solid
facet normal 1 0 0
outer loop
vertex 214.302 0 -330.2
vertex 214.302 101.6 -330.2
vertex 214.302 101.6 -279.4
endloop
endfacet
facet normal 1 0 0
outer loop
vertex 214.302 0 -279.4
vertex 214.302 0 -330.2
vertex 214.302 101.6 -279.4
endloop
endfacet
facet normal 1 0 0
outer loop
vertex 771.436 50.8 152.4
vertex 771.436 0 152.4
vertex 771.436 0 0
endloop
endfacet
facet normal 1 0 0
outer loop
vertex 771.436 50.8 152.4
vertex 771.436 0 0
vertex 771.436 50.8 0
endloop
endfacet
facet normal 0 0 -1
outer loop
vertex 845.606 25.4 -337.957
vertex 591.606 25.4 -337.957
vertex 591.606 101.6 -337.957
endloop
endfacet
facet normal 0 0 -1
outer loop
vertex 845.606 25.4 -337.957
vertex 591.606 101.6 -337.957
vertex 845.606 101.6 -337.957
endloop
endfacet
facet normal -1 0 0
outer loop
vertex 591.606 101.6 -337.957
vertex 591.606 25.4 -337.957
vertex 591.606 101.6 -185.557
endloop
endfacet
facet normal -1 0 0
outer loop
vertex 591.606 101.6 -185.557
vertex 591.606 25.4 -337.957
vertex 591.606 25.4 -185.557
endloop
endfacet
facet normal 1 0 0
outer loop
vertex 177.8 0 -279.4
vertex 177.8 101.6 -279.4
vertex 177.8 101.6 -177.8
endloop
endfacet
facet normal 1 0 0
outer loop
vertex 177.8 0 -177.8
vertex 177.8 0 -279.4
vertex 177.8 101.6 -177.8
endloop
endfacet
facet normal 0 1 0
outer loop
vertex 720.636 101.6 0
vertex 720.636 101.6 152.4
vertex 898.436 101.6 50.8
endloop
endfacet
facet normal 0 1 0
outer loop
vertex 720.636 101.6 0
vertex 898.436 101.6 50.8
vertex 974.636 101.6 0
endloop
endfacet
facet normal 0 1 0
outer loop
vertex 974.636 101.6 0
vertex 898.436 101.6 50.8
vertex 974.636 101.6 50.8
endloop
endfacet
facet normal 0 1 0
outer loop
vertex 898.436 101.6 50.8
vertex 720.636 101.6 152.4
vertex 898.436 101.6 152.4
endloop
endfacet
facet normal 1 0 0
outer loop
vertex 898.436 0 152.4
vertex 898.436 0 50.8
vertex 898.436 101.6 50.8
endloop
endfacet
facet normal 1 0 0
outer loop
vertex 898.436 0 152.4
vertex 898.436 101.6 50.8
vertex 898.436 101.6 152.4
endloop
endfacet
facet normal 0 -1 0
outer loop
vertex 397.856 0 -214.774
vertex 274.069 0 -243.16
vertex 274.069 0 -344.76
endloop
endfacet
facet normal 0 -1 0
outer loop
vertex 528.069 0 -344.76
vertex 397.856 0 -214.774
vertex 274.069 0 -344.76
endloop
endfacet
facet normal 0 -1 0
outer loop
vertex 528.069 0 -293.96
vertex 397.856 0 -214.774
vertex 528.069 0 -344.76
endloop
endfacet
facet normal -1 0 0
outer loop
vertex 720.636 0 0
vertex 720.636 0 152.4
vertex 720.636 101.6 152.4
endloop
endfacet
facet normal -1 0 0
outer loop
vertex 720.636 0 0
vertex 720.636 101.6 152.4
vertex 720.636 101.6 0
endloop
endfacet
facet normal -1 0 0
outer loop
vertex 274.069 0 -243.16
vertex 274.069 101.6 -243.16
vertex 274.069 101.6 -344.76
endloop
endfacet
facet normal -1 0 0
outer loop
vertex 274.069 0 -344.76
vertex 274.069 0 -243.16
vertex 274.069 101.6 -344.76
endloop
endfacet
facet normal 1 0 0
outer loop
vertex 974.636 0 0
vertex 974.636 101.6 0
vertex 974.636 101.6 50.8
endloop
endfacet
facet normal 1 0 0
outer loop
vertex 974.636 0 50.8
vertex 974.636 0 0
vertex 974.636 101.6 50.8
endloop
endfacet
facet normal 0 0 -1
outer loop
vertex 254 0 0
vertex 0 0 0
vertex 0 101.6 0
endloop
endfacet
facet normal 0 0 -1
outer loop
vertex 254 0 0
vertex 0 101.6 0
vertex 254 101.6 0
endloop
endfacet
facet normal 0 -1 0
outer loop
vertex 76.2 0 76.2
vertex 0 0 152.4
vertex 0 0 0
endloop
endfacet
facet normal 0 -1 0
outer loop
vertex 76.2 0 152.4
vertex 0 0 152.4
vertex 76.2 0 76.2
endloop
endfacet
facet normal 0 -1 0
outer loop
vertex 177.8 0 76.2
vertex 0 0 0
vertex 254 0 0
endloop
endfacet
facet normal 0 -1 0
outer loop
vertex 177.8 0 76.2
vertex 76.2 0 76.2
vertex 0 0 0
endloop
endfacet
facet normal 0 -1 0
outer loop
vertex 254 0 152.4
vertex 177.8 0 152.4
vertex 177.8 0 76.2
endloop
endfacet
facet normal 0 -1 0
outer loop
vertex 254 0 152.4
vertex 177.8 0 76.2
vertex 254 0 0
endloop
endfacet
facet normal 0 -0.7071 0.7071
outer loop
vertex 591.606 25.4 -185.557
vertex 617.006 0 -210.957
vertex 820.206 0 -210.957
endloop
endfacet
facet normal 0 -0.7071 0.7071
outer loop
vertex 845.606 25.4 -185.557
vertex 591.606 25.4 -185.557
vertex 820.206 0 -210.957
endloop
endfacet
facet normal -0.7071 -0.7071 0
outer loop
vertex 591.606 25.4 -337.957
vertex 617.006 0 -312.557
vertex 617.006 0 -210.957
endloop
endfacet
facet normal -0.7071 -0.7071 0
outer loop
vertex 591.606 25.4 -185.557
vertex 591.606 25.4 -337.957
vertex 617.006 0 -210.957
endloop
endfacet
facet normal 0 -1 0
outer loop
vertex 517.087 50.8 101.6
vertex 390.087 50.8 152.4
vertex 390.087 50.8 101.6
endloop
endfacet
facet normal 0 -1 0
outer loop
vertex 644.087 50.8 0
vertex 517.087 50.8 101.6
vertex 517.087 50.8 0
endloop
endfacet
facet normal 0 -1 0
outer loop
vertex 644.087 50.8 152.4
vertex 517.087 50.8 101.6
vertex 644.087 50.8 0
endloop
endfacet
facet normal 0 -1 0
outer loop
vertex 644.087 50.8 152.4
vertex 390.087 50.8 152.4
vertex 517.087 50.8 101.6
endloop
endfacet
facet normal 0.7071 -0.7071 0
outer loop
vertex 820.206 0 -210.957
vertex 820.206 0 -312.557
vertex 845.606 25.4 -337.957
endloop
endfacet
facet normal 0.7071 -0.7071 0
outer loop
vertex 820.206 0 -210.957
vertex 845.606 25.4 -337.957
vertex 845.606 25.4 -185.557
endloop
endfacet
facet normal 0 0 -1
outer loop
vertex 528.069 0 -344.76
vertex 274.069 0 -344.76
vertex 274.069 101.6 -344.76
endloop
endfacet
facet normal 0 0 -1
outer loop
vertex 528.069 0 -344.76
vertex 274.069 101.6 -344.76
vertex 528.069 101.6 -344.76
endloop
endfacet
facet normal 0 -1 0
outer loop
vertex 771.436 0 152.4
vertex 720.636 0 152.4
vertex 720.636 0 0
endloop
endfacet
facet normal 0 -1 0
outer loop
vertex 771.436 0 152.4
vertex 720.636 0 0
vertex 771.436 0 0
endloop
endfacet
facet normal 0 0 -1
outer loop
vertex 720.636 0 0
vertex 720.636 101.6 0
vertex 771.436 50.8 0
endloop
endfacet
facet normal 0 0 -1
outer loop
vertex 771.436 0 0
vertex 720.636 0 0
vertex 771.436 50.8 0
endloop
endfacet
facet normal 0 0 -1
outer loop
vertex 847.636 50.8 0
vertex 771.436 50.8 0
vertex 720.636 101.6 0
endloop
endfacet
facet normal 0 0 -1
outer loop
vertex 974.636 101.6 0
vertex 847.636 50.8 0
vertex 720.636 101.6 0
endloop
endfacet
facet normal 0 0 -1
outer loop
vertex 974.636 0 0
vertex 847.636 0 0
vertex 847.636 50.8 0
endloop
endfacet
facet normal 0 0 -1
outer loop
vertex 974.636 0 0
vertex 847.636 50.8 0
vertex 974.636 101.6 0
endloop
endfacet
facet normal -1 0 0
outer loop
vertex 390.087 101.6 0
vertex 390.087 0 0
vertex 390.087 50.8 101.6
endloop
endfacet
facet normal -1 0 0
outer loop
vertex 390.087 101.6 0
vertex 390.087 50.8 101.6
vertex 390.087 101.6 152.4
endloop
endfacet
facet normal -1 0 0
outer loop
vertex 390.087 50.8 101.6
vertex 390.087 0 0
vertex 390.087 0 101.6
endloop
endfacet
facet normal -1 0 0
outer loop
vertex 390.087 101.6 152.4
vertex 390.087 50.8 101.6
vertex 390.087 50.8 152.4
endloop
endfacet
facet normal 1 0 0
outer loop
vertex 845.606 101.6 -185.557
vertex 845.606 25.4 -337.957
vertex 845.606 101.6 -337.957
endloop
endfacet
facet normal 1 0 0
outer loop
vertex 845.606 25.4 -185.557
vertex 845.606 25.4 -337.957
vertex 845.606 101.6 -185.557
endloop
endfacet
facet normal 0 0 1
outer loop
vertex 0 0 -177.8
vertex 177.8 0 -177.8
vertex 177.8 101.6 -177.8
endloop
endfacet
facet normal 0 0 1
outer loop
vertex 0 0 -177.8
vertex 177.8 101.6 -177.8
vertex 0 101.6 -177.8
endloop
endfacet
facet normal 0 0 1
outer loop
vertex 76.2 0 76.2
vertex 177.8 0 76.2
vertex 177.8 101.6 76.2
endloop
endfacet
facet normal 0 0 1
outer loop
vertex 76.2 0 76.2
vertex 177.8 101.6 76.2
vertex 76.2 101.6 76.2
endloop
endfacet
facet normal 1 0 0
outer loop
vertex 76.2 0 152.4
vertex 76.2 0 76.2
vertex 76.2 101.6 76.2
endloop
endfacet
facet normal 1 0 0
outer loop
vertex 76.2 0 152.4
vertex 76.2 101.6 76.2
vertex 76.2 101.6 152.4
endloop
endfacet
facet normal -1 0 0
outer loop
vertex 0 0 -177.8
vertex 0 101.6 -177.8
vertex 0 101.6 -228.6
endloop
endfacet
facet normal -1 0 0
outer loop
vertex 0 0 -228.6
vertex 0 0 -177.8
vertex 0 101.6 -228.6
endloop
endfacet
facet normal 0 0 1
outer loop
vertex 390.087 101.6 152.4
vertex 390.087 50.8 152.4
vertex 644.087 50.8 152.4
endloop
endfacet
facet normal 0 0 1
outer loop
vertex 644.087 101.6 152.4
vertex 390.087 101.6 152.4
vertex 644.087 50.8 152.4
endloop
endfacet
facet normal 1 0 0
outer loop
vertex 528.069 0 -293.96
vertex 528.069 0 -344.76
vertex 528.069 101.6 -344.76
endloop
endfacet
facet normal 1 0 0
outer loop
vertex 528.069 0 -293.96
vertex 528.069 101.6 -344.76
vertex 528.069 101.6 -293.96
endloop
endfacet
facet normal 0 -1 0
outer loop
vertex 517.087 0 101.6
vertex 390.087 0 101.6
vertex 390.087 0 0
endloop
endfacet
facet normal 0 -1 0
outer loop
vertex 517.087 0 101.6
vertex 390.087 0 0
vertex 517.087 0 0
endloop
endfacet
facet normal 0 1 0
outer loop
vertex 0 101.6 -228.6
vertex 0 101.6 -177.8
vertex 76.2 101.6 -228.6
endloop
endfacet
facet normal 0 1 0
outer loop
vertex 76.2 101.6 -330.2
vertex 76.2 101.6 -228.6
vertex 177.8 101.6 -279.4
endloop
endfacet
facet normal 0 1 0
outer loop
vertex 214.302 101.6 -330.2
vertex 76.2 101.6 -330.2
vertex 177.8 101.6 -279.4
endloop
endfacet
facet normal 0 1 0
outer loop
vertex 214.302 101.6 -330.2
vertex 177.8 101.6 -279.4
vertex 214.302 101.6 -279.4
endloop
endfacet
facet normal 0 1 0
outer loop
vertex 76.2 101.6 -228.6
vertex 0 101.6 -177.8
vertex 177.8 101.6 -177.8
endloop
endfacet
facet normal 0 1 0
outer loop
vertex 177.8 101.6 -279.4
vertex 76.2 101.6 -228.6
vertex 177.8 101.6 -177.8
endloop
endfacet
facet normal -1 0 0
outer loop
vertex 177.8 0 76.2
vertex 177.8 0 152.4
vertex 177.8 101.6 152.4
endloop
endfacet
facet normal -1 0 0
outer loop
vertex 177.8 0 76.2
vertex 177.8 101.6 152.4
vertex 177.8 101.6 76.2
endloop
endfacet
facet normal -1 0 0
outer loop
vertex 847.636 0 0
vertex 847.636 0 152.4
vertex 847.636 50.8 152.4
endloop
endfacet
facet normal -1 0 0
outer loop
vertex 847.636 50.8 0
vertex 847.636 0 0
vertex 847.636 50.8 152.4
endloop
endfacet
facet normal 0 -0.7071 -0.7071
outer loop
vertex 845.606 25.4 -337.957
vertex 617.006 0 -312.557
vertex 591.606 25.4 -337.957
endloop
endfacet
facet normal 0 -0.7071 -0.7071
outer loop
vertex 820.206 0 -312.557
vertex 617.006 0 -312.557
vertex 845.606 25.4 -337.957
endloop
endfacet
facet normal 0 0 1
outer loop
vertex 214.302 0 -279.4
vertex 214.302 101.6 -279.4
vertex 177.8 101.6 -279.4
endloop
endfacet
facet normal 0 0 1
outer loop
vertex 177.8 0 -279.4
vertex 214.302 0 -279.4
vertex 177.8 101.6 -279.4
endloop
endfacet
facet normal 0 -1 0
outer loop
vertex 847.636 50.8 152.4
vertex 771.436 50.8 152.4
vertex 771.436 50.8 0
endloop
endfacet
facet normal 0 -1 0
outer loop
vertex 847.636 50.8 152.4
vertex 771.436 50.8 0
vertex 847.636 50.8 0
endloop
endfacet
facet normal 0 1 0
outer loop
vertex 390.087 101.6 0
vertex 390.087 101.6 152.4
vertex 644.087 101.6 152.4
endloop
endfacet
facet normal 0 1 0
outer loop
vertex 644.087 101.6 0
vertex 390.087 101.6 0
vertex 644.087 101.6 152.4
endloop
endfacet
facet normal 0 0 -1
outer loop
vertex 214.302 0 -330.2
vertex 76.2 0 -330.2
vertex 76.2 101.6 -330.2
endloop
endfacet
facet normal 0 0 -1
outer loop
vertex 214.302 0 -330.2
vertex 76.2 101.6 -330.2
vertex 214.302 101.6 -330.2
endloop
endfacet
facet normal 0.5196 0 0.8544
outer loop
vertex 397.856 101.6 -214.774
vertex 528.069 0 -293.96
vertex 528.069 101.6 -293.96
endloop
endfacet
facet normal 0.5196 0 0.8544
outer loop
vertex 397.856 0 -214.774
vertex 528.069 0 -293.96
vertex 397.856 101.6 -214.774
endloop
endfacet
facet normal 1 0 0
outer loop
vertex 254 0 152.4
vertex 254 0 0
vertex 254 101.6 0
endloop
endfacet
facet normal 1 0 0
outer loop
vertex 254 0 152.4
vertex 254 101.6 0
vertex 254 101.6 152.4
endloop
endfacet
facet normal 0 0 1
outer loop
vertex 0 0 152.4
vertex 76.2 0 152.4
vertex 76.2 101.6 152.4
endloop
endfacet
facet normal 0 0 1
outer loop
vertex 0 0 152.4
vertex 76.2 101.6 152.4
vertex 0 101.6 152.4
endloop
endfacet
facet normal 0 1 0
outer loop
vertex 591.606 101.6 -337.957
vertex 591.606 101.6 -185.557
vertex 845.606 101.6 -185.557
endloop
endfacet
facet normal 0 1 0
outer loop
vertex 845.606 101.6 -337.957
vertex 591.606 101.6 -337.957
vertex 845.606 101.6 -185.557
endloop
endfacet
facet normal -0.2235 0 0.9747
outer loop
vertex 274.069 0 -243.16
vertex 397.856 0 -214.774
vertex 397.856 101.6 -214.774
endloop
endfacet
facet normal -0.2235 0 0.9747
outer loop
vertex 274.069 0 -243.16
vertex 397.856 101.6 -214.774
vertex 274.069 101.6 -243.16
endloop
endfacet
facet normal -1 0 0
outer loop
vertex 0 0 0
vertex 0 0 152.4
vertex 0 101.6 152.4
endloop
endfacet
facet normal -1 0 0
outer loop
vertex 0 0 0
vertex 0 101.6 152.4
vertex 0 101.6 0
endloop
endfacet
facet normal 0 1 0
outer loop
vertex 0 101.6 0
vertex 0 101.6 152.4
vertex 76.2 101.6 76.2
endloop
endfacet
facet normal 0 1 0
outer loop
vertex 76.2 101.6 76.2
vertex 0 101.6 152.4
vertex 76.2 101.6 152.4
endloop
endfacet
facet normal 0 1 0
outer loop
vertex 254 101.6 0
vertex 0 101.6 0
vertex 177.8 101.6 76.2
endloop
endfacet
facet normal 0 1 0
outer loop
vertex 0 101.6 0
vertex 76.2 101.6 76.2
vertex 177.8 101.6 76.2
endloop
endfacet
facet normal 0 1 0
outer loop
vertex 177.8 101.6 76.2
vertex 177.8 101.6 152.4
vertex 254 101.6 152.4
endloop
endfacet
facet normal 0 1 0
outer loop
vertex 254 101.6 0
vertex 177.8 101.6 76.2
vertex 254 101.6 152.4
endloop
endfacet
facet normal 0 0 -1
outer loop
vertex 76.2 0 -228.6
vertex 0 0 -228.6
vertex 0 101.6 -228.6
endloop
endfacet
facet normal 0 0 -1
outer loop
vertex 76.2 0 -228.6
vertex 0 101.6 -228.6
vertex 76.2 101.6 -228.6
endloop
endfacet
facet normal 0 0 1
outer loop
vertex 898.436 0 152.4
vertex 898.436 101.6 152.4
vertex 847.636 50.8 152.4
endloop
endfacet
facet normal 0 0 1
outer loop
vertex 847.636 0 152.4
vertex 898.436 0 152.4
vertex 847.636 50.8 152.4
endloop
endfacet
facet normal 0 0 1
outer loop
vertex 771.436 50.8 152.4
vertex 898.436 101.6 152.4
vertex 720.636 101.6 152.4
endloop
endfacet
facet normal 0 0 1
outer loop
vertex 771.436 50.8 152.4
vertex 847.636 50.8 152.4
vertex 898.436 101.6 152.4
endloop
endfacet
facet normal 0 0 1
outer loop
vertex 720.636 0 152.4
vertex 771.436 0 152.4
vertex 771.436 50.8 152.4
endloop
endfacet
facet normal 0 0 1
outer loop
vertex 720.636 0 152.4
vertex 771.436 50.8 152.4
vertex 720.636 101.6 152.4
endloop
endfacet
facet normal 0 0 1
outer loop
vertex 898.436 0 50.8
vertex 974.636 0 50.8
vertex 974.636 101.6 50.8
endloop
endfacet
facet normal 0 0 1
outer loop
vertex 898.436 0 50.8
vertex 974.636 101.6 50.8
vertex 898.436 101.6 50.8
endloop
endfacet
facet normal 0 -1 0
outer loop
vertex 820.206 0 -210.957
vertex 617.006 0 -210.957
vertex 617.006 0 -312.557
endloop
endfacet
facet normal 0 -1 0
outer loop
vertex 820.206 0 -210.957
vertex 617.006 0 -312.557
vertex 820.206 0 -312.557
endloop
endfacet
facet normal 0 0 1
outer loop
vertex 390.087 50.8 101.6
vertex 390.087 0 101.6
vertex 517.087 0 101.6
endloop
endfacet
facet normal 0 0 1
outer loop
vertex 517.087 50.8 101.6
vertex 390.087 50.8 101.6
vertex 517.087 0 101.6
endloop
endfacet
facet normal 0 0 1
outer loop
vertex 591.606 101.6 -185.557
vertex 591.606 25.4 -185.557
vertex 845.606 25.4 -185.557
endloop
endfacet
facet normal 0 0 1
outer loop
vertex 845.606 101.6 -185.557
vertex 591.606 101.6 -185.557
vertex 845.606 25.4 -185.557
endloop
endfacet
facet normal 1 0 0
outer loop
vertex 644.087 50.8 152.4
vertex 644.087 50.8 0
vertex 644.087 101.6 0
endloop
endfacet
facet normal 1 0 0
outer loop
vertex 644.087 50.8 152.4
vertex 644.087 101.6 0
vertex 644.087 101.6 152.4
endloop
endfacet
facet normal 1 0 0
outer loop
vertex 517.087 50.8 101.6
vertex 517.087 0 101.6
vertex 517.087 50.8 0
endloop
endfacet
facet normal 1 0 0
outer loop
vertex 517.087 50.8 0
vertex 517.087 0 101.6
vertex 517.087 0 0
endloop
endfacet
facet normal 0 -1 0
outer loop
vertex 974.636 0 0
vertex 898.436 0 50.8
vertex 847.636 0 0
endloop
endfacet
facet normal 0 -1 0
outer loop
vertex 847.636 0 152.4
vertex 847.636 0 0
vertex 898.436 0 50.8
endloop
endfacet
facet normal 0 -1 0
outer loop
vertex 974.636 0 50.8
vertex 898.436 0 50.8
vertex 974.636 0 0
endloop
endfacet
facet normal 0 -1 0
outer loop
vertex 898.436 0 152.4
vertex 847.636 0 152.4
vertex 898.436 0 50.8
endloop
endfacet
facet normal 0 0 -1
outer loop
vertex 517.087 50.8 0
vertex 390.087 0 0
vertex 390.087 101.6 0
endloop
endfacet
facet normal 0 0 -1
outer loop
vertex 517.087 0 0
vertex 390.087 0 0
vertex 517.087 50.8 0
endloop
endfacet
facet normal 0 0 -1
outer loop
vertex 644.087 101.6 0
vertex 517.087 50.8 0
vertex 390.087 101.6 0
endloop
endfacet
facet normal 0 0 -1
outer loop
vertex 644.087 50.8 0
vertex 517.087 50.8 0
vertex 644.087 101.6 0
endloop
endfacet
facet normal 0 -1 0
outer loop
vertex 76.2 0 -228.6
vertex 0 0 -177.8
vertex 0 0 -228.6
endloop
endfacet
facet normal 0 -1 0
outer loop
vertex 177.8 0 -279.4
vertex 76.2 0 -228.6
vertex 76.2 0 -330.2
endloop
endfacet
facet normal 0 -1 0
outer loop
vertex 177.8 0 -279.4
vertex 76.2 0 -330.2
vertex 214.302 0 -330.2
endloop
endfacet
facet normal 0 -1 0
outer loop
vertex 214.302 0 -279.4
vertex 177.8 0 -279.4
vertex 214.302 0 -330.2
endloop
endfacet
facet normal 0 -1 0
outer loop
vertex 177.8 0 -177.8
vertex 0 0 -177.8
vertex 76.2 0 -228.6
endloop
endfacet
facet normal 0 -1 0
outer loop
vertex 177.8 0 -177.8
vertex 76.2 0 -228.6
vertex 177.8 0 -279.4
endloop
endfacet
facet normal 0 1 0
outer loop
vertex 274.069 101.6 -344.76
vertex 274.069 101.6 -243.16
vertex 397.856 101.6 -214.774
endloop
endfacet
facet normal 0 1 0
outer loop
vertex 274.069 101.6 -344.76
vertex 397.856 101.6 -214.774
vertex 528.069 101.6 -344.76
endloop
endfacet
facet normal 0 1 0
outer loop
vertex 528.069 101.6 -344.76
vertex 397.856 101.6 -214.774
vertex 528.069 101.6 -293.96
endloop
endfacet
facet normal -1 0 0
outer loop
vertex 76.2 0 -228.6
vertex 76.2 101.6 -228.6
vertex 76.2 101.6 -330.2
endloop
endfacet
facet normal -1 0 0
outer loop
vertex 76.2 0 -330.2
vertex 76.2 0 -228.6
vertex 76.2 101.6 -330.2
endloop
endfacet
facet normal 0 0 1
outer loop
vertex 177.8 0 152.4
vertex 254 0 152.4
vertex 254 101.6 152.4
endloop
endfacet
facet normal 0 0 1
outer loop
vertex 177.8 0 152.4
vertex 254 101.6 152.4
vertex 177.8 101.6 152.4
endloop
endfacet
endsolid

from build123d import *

# Parameters (mm, degrees)
F1_DEPTH  = 101.6
F2_W      = 254
F2_H      = 152.4
F3_DEPTH  = 101.6
F5_DEPTH  = 50.8
F7_DEPTH  = 101.6
F8_W      = 76.2
F8_H      = 50.8
F9_DEPTH  = 152.4
F11_DEPTH = 101.6
F13_DEPTH = 101.6
F14_W     = 254
F14_H     = 152.4
F15_DEPTH = 101.6
F16_SIZE  = 25.4
F17_DEPTH = 25.4
F18_DEPTH = 74.676


with BuildPart() as f1:
    # F0 (on Front) → F1 (new body)
    with BuildSketch(Plane.XZ):
        Polygon((0, 152.4), (0, 0), (254, 0), (254, 152.4), (177.8, 152.4), (177.8, 76.2), (76.2, 76.2), (76.2, 152.4), align=None)
    extrude(amount=-F1_DEPTH)



with BuildPart() as f3:
    # F2 (on Front) → F3 (new body)
    with BuildSketch(Plane.XZ):
        with Locations((517.0868965597, 76.2)):
            Rectangle(F2_W, F2_H)
    extrude(amount=-F3_DEPTH)

    # F4 (on face) → F5 (cut)
    with BuildSketch(Plane.XZ):
        Polygon((644.0868965597, 152.4), (390.0868965597, 152.4), (390.0868965597, 101.6), (517.0868965597, 101.6), (517.0868965597, 0), (644.0868965597, 0), align=None)
    extrude(amount=-F5_DEPTH, mode=Mode.SUBTRACT)


with BuildPart() as f7:
    # F6 (on Front) → F7 (new body)
    with BuildSketch(Plane.XZ):
        Polygon((720.6364183982, 152.4), (720.6364183982, 0), (974.6364183982, 0), (974.6364183982, 50.8), (898.4364183982, 50.8), (898.4364183982, 152.4), align=None)
    extrude(amount=-F7_DEPTH)

    # F8 (on face) → F9 (cut)
    with BuildSketch(Plane.XY.offset(152.4)):
        with Locations((809.5364183982, 25.4)):
            Rectangle(F8_W, F8_H)
    extrude(amount=-F9_DEPTH, mode=Mode.SUBTRACT)


with BuildPart() as f11:
    # F10 (on Front) → F11 (new body)
    with BuildSketch(Plane.XZ):
        Polygon((177.8, -177.8), (0, -177.8), (0, -228.6), (76.2, -228.6), (76.2, -330.2), (214.3024325587, -330.2), (214.3024325587, -279.4), (177.8, -279.4), align=None)
    extrude(amount=-F11_DEPTH)


with BuildPart() as f13:
    # F12 (on Front) → F13 (new body)
    with BuildSketch(Plane.XZ):
        Polygon((274.0688374149, -243.1599593614), (274.0688374149, -344.7599593614), (528.0688374149, -344.7599593614), (528.0688374149, -293.9599593614), (397.8559698996, -214.774296938), align=None)
    extrude(amount=-F13_DEPTH)


with BuildPart() as f15:
    # F14 (on Front) → F15 (new body)
    with BuildSketch(Plane.XZ):
        with Locations((718.6061441898, -261.7572938768)):
            Rectangle(F14_W, F14_H)
    extrude(amount=-F15_DEPTH)

    # F16
    f16_edges = [f15.edges().sort_by_distance(p)[0] for p in [
        (591.606144, 0, -261.757294),
        (718.606144, 0, -337.957294),
        (845.606144, 0, -261.757294),
        (718.606144, 0, -185.557294),
    ]]
    chamfer(f16_edges, length=F16_SIZE)


with BuildPart() as f17:
    # F0 (on Front) → F17 (new body)
    with BuildSketch(Plane.XZ):
        Polygon((0, 152.4), (0, 0), (254, 0), (254, 152.4), (177.8, 152.4), (177.8, 76.2), (76.2, 76.2), (76.2, 152.4), align=None)
    extrude(amount=-F17_DEPTH)


with BuildPart() as f1_1:
    add(f1.part)

    add(f17.part)  # F18 merges F17
    # F0 (on Front) → F18 (join)
    with BuildSketch(Plane.XZ):
        Polygon((0, 152.4), (0, 0), (254, 0), (254, 152.4), (177.8, 152.4), (177.8, 76.2), (76.2, 76.2), (76.2, 152.4), align=None)
    extrude(amount=-F18_DEPTH)


solid = Compound([f3.part, f7.part, f11.part, f13.part, f15.part, f1_1.part])
